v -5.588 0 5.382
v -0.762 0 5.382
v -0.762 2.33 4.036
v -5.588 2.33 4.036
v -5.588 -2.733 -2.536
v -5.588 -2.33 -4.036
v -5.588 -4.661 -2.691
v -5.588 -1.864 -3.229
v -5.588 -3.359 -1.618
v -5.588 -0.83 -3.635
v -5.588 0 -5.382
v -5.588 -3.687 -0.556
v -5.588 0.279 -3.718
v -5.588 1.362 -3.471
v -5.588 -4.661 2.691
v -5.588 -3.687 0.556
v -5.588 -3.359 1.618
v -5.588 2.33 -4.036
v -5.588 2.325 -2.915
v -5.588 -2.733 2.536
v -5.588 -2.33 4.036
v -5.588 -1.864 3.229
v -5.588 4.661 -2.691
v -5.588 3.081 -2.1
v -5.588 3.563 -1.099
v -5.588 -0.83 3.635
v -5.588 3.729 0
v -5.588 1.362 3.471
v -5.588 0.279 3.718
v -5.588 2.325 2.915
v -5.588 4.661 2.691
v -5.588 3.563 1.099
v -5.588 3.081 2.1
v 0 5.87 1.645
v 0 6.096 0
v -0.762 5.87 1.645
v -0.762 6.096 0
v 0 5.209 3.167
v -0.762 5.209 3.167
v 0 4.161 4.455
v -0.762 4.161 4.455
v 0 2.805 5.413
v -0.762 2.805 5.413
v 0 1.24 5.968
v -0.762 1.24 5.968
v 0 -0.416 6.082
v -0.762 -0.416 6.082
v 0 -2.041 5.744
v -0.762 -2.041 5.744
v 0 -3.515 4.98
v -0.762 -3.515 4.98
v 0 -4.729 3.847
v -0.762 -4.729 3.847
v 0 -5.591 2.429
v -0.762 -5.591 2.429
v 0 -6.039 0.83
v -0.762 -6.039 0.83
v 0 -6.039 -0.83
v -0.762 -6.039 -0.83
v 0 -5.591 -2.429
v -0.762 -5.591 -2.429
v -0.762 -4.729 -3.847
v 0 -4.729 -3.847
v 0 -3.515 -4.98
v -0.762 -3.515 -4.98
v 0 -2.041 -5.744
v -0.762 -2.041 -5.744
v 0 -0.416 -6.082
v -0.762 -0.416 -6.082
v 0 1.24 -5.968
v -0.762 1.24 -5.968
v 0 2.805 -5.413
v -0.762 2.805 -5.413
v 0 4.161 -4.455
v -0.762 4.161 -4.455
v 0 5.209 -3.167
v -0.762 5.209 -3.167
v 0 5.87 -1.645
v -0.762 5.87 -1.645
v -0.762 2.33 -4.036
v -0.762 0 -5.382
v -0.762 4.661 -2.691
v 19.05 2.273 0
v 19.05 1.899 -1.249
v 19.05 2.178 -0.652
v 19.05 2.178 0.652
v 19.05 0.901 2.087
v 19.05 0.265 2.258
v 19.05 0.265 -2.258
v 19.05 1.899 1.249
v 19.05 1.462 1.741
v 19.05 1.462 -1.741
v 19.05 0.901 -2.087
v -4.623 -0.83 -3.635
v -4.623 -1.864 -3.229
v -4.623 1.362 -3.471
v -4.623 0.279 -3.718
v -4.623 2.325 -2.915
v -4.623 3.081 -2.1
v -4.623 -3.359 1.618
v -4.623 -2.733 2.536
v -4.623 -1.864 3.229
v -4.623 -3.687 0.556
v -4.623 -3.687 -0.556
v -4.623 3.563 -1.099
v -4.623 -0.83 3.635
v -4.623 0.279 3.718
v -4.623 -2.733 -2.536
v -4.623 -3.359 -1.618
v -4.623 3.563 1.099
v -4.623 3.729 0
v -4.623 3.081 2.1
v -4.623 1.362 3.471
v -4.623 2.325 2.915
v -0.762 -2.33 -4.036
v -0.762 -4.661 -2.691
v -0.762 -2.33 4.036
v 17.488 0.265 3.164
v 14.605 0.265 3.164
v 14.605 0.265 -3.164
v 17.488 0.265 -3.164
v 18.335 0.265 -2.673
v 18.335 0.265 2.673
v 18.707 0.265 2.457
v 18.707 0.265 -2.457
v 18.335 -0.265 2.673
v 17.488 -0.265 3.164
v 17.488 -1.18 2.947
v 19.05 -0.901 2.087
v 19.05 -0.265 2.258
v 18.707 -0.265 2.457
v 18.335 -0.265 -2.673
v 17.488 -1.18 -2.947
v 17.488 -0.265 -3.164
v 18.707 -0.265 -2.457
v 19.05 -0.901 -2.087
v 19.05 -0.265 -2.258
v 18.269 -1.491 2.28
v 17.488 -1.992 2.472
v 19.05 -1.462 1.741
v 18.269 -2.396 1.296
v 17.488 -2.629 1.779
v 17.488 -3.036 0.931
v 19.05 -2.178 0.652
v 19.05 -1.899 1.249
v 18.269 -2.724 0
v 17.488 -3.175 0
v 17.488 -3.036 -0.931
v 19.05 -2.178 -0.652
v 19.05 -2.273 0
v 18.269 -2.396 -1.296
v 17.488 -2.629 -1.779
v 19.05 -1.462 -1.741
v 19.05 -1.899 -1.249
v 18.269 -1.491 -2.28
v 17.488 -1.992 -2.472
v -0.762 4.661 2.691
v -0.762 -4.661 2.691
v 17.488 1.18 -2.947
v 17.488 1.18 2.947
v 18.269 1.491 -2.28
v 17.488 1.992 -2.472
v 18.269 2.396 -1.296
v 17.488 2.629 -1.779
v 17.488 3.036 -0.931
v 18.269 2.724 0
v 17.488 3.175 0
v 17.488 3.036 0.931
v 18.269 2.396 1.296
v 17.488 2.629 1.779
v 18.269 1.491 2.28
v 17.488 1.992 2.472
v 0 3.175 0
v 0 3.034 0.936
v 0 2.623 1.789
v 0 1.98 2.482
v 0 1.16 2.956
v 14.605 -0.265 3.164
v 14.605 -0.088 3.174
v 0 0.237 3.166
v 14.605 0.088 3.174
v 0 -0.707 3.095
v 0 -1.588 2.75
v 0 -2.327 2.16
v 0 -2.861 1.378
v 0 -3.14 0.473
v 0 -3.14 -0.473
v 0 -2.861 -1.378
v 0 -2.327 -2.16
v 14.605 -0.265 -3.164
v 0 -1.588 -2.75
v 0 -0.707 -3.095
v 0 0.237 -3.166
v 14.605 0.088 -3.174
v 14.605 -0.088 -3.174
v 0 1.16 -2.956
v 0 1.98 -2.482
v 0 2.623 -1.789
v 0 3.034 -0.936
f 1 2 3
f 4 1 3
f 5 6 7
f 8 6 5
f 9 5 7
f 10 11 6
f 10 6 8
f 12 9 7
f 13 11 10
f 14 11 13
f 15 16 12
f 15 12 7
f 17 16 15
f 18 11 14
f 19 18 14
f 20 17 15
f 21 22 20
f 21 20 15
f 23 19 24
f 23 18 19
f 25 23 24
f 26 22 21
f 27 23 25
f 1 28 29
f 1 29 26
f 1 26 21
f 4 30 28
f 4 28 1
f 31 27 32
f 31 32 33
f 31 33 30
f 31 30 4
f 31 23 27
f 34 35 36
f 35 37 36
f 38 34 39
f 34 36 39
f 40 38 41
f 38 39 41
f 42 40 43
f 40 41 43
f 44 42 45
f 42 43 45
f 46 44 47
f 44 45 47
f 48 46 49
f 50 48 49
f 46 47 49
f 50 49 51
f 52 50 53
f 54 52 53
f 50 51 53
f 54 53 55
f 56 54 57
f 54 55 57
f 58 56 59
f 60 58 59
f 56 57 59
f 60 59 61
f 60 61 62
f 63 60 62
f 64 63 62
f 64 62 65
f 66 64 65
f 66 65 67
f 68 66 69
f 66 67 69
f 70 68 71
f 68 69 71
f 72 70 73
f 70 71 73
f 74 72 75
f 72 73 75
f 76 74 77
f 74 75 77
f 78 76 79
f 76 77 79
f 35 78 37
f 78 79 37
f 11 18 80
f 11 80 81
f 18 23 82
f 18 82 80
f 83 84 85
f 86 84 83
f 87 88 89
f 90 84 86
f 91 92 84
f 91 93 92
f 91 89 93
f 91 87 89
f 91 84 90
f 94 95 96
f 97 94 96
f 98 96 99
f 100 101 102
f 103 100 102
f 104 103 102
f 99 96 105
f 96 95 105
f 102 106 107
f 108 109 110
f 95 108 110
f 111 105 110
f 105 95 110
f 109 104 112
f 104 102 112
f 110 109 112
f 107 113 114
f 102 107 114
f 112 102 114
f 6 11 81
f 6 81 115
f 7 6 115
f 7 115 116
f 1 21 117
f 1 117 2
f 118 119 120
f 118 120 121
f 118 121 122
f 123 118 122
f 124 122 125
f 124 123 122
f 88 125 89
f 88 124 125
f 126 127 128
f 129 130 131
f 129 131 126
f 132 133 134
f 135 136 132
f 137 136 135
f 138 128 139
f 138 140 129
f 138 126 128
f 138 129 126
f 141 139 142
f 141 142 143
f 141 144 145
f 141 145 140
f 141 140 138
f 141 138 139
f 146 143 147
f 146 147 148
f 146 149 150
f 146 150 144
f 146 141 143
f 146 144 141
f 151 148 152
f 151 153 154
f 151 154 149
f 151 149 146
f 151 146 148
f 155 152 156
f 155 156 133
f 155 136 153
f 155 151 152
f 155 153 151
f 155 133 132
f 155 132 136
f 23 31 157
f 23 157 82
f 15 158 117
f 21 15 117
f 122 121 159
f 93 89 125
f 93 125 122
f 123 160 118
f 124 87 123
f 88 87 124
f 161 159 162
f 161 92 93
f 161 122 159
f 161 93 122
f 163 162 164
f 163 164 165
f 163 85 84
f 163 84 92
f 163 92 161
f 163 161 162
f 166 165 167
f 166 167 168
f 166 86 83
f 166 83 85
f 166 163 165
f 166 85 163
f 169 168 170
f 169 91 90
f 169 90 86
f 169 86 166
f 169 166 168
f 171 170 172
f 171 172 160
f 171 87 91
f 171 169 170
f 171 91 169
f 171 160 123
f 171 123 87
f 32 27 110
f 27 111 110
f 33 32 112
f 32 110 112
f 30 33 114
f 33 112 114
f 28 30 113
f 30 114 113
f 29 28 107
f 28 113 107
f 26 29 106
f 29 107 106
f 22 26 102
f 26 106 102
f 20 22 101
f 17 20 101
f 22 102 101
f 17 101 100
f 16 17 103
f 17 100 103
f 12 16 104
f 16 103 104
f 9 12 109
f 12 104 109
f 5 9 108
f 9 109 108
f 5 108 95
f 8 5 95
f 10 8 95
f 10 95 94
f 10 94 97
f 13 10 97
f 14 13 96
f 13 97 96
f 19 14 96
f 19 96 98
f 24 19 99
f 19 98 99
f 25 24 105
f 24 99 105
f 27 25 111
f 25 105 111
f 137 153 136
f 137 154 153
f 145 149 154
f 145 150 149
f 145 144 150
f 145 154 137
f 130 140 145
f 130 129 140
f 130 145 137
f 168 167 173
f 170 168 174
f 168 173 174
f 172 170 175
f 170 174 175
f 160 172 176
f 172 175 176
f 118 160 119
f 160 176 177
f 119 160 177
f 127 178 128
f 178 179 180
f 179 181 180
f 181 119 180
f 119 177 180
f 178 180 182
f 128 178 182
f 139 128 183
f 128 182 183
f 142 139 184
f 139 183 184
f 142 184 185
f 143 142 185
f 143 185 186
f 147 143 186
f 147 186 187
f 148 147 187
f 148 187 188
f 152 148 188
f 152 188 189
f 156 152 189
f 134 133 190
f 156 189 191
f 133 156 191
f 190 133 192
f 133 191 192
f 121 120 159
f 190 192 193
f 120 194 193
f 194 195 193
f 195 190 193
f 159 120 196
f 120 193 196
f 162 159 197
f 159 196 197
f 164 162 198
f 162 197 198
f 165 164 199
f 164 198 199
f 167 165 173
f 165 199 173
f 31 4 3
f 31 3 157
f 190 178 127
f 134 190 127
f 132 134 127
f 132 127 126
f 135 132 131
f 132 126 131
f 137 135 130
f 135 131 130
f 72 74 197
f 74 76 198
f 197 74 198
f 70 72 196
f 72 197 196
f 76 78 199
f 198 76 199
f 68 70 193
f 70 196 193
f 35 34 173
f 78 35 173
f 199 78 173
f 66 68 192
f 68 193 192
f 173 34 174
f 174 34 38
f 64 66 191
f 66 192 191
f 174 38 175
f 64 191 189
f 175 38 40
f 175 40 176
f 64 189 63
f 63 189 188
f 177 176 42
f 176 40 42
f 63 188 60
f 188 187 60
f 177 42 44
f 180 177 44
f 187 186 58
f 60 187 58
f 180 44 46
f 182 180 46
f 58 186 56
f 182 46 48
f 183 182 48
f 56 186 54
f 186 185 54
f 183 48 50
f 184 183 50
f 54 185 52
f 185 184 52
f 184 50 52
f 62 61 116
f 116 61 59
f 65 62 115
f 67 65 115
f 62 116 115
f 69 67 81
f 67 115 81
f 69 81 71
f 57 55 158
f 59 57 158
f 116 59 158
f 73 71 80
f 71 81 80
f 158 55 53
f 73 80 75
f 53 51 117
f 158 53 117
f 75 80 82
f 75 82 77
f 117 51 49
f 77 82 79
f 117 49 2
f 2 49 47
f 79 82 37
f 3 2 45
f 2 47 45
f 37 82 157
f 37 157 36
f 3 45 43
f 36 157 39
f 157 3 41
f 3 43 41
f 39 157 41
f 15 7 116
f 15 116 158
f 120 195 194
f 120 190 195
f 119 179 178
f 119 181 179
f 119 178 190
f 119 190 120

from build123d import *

# Parameters (mm, degrees)
EXTRUDE1_REACH                 = 26.638
SKETCH13_W                     = 4.445
SKETCH13_H                     = 0.529166666
POINT_CUT_EXTRUDE10_DEPTH      = 7.096
POINT_CUT_EXTRUDE10_DEPTH_BACK = 7.096


with BuildPart() as part:
    # Sketch1 → base-Revolve (revolve)
    with BuildSketch(Plane.XY):
        Polygon((0, 6.096), (-0.762, 6.096), (-0.762, 4.6609), (-5.588, 4.6609), (-5.588, 3.72872), (-4.6228, 3.72872), (-4.6228, 0), (0, 0), (19.05, 0), (19.05, 3.175), (0, 3.175), align=None)
    revolve(axis=Axis((0, 0, 0), (1, 0, 0)))

    # Sketch15 → Extrude1 (add, up to next)
    with BuildSketch(Plane.ZY.offset(5.588), mode=Mode.PRIVATE) as extrude1_sk1:
        with BuildLine():
            ThreePointArc((-4.036457824, -2.330449967), (-4.6609, 3.6e-08), (-4.036457787, 2.33045003))
            Line((-4.036457787, 2.33045003), (-5.381943739, 0))
            Line((-5.381943739, 0), (-4.036457824, -2.330449967))
        make_face()
    extrude1_tool1 = extrude(extrude1_sk1.sketch, amount=-EXTRUDE1_REACH, mode=Mode.PRIVATE) - part.part
    add(extrude1_tool1.solids().sort_by_distance((-5.588, 0, -4.817334))[0])
    # Sketch15 → Extrude1 (add, up to next)
    with BuildSketch(Plane.ZY.offset(5.588), mode=Mode.PRIVATE) as extrude1_sk2:
        with BuildLine():
            ThreePointArc((-4.036457787, 2.33045003), (-2.330449985, 4.036457813), (0, 4.6609))
            Line((0, 4.6609), (-2.69097187, 4.6609))
            Line((-2.69097187, 4.6609), (-4.036457787, 2.33045003))
        make_face()
    extrude1_tool2 = extrude(extrude1_sk2.sketch, amount=-EXTRUDE1_REACH, mode=Mode.PRIVATE) - part.part
    add(extrude1_tool2.solids().sort_by_distance((-5.588, 4.171933, -2.408667))[0])
    # Sketch15 → Extrude1 (add, up to next)
    with BuildSketch(Plane.ZY.offset(5.588), mode=Mode.PRIVATE) as extrude1_sk3:
        with BuildLine():
            ThreePointArc((0, 4.6609), (2.330450001, 4.036457804), (4.036457805, 2.330449998))
            Line((4.036457805, 2.330449998), (2.69097187, 4.6609))
            Line((2.69097187, 4.6609), (0, 4.6609))
        make_face()
    extrude1_tool3 = extrude(extrude1_sk3.sketch, amount=-EXTRUDE1_REACH, mode=Mode.PRIVATE) - part.part
    add(extrude1_tool3.solids().sort_by_distance((-5.588, 4.171933, 2.408667))[0])
    # Sketch15 → Extrude1 (add, up to next)
    with BuildSketch(Plane.ZY.offset(5.588), mode=Mode.PRIVATE) as extrude1_sk4:
        with BuildLine():
            Line((4.036457776, -2.330450049), (5.381943739, 0))
            Line((5.381943739, 0), (4.036457805, 2.330449998))
            ThreePointArc((4.036457805, 2.330449998), (4.502083684, 1.206329686), (4.6609, 0))
            ThreePointArc((4.6609, 0), (4.502083676, -1.206329715), (4.036457776, -2.330450049))
        make_face()
    extrude1_tool4 = extrude(extrude1_sk4.sketch, amount=-EXTRUDE1_REACH, mode=Mode.PRIVATE) - part.part
    add(extrude1_tool4.solids().sort_by_distance((-5.588, 0, 4.817334))[0])
    # Sketch15 → Extrude1 (add, up to next)
    with BuildSketch(Plane.ZY.offset(5.588), mode=Mode.PRIVATE) as extrude1_sk5:
        with BuildLine():
            Line((2.69097187, -4.6609), (4.036457776, -2.330450049))
            ThreePointArc((4.036457776, -2.330450049), (2.330449975, -4.036457819), (0, -4.6609))
            Line((0, -4.6609), (2.69097187, -4.6609))
        make_face()
    extrude1_tool5 = extrude(extrude1_sk5.sketch, amount=-EXTRUDE1_REACH, mode=Mode.PRIVATE) - part.part
    add(extrude1_tool5.solids().sort_by_distance((-5.588, -4.171933, 2.408667))[0])
    # Sketch15 → Extrude1 (add, up to next)
    with BuildSketch(Plane.ZY.offset(5.588), mode=Mode.PRIVATE) as extrude1_sk6:
        with BuildLine():
            Line((-2.69097187, -4.6609), (0, -4.6609))
            ThreePointArc((0, -4.6609), (-2.330450017, -4.036457795), (-4.036457824, -2.330449967))
            Line((-4.036457824, -2.330449967), (-2.69097187, -4.6609))
        make_face()
    extrude1_tool6 = extrude(extrude1_sk6.sketch, amount=-EXTRUDE1_REACH, mode=Mode.PRIVATE) - part.part
    add(extrude1_tool6.solids().sort_by_distance((-5.588, -4.171933, -2.408667))[0])

    # Sketch8 → point_Cut-Revolve1 (revolve, cut)
    with BuildSketch(Plane.XY):
        Polygon((19.05, 0), (19.558, 0), (19.558, 3.683), (17.488209787, 3.683), (17.488209787, 3.175), (19.05, 2.2733), align=None)
    revolve(axis=Axis((0, 0, 0), (1, 0, 0)), mode=Mode.SUBTRACT)

    # Sketch13 → point_Cut-Extrude10 (cut, two sides)
    with BuildSketch(Plane.XY) as point_cut_extrude10_sk:
        with Locations((16.8275, 0)):
            Rectangle(SKETCH13_W, SKETCH13_H)
    extrude(amount=POINT_CUT_EXTRUDE10_DEPTH, mode=Mode.SUBTRACT)
    extrude(point_cut_extrude10_sk.sketch, amount=-POINT_CUT_EXTRUDE10_DEPTH_BACK, mode=Mode.SUBTRACT)


solid = part.part
